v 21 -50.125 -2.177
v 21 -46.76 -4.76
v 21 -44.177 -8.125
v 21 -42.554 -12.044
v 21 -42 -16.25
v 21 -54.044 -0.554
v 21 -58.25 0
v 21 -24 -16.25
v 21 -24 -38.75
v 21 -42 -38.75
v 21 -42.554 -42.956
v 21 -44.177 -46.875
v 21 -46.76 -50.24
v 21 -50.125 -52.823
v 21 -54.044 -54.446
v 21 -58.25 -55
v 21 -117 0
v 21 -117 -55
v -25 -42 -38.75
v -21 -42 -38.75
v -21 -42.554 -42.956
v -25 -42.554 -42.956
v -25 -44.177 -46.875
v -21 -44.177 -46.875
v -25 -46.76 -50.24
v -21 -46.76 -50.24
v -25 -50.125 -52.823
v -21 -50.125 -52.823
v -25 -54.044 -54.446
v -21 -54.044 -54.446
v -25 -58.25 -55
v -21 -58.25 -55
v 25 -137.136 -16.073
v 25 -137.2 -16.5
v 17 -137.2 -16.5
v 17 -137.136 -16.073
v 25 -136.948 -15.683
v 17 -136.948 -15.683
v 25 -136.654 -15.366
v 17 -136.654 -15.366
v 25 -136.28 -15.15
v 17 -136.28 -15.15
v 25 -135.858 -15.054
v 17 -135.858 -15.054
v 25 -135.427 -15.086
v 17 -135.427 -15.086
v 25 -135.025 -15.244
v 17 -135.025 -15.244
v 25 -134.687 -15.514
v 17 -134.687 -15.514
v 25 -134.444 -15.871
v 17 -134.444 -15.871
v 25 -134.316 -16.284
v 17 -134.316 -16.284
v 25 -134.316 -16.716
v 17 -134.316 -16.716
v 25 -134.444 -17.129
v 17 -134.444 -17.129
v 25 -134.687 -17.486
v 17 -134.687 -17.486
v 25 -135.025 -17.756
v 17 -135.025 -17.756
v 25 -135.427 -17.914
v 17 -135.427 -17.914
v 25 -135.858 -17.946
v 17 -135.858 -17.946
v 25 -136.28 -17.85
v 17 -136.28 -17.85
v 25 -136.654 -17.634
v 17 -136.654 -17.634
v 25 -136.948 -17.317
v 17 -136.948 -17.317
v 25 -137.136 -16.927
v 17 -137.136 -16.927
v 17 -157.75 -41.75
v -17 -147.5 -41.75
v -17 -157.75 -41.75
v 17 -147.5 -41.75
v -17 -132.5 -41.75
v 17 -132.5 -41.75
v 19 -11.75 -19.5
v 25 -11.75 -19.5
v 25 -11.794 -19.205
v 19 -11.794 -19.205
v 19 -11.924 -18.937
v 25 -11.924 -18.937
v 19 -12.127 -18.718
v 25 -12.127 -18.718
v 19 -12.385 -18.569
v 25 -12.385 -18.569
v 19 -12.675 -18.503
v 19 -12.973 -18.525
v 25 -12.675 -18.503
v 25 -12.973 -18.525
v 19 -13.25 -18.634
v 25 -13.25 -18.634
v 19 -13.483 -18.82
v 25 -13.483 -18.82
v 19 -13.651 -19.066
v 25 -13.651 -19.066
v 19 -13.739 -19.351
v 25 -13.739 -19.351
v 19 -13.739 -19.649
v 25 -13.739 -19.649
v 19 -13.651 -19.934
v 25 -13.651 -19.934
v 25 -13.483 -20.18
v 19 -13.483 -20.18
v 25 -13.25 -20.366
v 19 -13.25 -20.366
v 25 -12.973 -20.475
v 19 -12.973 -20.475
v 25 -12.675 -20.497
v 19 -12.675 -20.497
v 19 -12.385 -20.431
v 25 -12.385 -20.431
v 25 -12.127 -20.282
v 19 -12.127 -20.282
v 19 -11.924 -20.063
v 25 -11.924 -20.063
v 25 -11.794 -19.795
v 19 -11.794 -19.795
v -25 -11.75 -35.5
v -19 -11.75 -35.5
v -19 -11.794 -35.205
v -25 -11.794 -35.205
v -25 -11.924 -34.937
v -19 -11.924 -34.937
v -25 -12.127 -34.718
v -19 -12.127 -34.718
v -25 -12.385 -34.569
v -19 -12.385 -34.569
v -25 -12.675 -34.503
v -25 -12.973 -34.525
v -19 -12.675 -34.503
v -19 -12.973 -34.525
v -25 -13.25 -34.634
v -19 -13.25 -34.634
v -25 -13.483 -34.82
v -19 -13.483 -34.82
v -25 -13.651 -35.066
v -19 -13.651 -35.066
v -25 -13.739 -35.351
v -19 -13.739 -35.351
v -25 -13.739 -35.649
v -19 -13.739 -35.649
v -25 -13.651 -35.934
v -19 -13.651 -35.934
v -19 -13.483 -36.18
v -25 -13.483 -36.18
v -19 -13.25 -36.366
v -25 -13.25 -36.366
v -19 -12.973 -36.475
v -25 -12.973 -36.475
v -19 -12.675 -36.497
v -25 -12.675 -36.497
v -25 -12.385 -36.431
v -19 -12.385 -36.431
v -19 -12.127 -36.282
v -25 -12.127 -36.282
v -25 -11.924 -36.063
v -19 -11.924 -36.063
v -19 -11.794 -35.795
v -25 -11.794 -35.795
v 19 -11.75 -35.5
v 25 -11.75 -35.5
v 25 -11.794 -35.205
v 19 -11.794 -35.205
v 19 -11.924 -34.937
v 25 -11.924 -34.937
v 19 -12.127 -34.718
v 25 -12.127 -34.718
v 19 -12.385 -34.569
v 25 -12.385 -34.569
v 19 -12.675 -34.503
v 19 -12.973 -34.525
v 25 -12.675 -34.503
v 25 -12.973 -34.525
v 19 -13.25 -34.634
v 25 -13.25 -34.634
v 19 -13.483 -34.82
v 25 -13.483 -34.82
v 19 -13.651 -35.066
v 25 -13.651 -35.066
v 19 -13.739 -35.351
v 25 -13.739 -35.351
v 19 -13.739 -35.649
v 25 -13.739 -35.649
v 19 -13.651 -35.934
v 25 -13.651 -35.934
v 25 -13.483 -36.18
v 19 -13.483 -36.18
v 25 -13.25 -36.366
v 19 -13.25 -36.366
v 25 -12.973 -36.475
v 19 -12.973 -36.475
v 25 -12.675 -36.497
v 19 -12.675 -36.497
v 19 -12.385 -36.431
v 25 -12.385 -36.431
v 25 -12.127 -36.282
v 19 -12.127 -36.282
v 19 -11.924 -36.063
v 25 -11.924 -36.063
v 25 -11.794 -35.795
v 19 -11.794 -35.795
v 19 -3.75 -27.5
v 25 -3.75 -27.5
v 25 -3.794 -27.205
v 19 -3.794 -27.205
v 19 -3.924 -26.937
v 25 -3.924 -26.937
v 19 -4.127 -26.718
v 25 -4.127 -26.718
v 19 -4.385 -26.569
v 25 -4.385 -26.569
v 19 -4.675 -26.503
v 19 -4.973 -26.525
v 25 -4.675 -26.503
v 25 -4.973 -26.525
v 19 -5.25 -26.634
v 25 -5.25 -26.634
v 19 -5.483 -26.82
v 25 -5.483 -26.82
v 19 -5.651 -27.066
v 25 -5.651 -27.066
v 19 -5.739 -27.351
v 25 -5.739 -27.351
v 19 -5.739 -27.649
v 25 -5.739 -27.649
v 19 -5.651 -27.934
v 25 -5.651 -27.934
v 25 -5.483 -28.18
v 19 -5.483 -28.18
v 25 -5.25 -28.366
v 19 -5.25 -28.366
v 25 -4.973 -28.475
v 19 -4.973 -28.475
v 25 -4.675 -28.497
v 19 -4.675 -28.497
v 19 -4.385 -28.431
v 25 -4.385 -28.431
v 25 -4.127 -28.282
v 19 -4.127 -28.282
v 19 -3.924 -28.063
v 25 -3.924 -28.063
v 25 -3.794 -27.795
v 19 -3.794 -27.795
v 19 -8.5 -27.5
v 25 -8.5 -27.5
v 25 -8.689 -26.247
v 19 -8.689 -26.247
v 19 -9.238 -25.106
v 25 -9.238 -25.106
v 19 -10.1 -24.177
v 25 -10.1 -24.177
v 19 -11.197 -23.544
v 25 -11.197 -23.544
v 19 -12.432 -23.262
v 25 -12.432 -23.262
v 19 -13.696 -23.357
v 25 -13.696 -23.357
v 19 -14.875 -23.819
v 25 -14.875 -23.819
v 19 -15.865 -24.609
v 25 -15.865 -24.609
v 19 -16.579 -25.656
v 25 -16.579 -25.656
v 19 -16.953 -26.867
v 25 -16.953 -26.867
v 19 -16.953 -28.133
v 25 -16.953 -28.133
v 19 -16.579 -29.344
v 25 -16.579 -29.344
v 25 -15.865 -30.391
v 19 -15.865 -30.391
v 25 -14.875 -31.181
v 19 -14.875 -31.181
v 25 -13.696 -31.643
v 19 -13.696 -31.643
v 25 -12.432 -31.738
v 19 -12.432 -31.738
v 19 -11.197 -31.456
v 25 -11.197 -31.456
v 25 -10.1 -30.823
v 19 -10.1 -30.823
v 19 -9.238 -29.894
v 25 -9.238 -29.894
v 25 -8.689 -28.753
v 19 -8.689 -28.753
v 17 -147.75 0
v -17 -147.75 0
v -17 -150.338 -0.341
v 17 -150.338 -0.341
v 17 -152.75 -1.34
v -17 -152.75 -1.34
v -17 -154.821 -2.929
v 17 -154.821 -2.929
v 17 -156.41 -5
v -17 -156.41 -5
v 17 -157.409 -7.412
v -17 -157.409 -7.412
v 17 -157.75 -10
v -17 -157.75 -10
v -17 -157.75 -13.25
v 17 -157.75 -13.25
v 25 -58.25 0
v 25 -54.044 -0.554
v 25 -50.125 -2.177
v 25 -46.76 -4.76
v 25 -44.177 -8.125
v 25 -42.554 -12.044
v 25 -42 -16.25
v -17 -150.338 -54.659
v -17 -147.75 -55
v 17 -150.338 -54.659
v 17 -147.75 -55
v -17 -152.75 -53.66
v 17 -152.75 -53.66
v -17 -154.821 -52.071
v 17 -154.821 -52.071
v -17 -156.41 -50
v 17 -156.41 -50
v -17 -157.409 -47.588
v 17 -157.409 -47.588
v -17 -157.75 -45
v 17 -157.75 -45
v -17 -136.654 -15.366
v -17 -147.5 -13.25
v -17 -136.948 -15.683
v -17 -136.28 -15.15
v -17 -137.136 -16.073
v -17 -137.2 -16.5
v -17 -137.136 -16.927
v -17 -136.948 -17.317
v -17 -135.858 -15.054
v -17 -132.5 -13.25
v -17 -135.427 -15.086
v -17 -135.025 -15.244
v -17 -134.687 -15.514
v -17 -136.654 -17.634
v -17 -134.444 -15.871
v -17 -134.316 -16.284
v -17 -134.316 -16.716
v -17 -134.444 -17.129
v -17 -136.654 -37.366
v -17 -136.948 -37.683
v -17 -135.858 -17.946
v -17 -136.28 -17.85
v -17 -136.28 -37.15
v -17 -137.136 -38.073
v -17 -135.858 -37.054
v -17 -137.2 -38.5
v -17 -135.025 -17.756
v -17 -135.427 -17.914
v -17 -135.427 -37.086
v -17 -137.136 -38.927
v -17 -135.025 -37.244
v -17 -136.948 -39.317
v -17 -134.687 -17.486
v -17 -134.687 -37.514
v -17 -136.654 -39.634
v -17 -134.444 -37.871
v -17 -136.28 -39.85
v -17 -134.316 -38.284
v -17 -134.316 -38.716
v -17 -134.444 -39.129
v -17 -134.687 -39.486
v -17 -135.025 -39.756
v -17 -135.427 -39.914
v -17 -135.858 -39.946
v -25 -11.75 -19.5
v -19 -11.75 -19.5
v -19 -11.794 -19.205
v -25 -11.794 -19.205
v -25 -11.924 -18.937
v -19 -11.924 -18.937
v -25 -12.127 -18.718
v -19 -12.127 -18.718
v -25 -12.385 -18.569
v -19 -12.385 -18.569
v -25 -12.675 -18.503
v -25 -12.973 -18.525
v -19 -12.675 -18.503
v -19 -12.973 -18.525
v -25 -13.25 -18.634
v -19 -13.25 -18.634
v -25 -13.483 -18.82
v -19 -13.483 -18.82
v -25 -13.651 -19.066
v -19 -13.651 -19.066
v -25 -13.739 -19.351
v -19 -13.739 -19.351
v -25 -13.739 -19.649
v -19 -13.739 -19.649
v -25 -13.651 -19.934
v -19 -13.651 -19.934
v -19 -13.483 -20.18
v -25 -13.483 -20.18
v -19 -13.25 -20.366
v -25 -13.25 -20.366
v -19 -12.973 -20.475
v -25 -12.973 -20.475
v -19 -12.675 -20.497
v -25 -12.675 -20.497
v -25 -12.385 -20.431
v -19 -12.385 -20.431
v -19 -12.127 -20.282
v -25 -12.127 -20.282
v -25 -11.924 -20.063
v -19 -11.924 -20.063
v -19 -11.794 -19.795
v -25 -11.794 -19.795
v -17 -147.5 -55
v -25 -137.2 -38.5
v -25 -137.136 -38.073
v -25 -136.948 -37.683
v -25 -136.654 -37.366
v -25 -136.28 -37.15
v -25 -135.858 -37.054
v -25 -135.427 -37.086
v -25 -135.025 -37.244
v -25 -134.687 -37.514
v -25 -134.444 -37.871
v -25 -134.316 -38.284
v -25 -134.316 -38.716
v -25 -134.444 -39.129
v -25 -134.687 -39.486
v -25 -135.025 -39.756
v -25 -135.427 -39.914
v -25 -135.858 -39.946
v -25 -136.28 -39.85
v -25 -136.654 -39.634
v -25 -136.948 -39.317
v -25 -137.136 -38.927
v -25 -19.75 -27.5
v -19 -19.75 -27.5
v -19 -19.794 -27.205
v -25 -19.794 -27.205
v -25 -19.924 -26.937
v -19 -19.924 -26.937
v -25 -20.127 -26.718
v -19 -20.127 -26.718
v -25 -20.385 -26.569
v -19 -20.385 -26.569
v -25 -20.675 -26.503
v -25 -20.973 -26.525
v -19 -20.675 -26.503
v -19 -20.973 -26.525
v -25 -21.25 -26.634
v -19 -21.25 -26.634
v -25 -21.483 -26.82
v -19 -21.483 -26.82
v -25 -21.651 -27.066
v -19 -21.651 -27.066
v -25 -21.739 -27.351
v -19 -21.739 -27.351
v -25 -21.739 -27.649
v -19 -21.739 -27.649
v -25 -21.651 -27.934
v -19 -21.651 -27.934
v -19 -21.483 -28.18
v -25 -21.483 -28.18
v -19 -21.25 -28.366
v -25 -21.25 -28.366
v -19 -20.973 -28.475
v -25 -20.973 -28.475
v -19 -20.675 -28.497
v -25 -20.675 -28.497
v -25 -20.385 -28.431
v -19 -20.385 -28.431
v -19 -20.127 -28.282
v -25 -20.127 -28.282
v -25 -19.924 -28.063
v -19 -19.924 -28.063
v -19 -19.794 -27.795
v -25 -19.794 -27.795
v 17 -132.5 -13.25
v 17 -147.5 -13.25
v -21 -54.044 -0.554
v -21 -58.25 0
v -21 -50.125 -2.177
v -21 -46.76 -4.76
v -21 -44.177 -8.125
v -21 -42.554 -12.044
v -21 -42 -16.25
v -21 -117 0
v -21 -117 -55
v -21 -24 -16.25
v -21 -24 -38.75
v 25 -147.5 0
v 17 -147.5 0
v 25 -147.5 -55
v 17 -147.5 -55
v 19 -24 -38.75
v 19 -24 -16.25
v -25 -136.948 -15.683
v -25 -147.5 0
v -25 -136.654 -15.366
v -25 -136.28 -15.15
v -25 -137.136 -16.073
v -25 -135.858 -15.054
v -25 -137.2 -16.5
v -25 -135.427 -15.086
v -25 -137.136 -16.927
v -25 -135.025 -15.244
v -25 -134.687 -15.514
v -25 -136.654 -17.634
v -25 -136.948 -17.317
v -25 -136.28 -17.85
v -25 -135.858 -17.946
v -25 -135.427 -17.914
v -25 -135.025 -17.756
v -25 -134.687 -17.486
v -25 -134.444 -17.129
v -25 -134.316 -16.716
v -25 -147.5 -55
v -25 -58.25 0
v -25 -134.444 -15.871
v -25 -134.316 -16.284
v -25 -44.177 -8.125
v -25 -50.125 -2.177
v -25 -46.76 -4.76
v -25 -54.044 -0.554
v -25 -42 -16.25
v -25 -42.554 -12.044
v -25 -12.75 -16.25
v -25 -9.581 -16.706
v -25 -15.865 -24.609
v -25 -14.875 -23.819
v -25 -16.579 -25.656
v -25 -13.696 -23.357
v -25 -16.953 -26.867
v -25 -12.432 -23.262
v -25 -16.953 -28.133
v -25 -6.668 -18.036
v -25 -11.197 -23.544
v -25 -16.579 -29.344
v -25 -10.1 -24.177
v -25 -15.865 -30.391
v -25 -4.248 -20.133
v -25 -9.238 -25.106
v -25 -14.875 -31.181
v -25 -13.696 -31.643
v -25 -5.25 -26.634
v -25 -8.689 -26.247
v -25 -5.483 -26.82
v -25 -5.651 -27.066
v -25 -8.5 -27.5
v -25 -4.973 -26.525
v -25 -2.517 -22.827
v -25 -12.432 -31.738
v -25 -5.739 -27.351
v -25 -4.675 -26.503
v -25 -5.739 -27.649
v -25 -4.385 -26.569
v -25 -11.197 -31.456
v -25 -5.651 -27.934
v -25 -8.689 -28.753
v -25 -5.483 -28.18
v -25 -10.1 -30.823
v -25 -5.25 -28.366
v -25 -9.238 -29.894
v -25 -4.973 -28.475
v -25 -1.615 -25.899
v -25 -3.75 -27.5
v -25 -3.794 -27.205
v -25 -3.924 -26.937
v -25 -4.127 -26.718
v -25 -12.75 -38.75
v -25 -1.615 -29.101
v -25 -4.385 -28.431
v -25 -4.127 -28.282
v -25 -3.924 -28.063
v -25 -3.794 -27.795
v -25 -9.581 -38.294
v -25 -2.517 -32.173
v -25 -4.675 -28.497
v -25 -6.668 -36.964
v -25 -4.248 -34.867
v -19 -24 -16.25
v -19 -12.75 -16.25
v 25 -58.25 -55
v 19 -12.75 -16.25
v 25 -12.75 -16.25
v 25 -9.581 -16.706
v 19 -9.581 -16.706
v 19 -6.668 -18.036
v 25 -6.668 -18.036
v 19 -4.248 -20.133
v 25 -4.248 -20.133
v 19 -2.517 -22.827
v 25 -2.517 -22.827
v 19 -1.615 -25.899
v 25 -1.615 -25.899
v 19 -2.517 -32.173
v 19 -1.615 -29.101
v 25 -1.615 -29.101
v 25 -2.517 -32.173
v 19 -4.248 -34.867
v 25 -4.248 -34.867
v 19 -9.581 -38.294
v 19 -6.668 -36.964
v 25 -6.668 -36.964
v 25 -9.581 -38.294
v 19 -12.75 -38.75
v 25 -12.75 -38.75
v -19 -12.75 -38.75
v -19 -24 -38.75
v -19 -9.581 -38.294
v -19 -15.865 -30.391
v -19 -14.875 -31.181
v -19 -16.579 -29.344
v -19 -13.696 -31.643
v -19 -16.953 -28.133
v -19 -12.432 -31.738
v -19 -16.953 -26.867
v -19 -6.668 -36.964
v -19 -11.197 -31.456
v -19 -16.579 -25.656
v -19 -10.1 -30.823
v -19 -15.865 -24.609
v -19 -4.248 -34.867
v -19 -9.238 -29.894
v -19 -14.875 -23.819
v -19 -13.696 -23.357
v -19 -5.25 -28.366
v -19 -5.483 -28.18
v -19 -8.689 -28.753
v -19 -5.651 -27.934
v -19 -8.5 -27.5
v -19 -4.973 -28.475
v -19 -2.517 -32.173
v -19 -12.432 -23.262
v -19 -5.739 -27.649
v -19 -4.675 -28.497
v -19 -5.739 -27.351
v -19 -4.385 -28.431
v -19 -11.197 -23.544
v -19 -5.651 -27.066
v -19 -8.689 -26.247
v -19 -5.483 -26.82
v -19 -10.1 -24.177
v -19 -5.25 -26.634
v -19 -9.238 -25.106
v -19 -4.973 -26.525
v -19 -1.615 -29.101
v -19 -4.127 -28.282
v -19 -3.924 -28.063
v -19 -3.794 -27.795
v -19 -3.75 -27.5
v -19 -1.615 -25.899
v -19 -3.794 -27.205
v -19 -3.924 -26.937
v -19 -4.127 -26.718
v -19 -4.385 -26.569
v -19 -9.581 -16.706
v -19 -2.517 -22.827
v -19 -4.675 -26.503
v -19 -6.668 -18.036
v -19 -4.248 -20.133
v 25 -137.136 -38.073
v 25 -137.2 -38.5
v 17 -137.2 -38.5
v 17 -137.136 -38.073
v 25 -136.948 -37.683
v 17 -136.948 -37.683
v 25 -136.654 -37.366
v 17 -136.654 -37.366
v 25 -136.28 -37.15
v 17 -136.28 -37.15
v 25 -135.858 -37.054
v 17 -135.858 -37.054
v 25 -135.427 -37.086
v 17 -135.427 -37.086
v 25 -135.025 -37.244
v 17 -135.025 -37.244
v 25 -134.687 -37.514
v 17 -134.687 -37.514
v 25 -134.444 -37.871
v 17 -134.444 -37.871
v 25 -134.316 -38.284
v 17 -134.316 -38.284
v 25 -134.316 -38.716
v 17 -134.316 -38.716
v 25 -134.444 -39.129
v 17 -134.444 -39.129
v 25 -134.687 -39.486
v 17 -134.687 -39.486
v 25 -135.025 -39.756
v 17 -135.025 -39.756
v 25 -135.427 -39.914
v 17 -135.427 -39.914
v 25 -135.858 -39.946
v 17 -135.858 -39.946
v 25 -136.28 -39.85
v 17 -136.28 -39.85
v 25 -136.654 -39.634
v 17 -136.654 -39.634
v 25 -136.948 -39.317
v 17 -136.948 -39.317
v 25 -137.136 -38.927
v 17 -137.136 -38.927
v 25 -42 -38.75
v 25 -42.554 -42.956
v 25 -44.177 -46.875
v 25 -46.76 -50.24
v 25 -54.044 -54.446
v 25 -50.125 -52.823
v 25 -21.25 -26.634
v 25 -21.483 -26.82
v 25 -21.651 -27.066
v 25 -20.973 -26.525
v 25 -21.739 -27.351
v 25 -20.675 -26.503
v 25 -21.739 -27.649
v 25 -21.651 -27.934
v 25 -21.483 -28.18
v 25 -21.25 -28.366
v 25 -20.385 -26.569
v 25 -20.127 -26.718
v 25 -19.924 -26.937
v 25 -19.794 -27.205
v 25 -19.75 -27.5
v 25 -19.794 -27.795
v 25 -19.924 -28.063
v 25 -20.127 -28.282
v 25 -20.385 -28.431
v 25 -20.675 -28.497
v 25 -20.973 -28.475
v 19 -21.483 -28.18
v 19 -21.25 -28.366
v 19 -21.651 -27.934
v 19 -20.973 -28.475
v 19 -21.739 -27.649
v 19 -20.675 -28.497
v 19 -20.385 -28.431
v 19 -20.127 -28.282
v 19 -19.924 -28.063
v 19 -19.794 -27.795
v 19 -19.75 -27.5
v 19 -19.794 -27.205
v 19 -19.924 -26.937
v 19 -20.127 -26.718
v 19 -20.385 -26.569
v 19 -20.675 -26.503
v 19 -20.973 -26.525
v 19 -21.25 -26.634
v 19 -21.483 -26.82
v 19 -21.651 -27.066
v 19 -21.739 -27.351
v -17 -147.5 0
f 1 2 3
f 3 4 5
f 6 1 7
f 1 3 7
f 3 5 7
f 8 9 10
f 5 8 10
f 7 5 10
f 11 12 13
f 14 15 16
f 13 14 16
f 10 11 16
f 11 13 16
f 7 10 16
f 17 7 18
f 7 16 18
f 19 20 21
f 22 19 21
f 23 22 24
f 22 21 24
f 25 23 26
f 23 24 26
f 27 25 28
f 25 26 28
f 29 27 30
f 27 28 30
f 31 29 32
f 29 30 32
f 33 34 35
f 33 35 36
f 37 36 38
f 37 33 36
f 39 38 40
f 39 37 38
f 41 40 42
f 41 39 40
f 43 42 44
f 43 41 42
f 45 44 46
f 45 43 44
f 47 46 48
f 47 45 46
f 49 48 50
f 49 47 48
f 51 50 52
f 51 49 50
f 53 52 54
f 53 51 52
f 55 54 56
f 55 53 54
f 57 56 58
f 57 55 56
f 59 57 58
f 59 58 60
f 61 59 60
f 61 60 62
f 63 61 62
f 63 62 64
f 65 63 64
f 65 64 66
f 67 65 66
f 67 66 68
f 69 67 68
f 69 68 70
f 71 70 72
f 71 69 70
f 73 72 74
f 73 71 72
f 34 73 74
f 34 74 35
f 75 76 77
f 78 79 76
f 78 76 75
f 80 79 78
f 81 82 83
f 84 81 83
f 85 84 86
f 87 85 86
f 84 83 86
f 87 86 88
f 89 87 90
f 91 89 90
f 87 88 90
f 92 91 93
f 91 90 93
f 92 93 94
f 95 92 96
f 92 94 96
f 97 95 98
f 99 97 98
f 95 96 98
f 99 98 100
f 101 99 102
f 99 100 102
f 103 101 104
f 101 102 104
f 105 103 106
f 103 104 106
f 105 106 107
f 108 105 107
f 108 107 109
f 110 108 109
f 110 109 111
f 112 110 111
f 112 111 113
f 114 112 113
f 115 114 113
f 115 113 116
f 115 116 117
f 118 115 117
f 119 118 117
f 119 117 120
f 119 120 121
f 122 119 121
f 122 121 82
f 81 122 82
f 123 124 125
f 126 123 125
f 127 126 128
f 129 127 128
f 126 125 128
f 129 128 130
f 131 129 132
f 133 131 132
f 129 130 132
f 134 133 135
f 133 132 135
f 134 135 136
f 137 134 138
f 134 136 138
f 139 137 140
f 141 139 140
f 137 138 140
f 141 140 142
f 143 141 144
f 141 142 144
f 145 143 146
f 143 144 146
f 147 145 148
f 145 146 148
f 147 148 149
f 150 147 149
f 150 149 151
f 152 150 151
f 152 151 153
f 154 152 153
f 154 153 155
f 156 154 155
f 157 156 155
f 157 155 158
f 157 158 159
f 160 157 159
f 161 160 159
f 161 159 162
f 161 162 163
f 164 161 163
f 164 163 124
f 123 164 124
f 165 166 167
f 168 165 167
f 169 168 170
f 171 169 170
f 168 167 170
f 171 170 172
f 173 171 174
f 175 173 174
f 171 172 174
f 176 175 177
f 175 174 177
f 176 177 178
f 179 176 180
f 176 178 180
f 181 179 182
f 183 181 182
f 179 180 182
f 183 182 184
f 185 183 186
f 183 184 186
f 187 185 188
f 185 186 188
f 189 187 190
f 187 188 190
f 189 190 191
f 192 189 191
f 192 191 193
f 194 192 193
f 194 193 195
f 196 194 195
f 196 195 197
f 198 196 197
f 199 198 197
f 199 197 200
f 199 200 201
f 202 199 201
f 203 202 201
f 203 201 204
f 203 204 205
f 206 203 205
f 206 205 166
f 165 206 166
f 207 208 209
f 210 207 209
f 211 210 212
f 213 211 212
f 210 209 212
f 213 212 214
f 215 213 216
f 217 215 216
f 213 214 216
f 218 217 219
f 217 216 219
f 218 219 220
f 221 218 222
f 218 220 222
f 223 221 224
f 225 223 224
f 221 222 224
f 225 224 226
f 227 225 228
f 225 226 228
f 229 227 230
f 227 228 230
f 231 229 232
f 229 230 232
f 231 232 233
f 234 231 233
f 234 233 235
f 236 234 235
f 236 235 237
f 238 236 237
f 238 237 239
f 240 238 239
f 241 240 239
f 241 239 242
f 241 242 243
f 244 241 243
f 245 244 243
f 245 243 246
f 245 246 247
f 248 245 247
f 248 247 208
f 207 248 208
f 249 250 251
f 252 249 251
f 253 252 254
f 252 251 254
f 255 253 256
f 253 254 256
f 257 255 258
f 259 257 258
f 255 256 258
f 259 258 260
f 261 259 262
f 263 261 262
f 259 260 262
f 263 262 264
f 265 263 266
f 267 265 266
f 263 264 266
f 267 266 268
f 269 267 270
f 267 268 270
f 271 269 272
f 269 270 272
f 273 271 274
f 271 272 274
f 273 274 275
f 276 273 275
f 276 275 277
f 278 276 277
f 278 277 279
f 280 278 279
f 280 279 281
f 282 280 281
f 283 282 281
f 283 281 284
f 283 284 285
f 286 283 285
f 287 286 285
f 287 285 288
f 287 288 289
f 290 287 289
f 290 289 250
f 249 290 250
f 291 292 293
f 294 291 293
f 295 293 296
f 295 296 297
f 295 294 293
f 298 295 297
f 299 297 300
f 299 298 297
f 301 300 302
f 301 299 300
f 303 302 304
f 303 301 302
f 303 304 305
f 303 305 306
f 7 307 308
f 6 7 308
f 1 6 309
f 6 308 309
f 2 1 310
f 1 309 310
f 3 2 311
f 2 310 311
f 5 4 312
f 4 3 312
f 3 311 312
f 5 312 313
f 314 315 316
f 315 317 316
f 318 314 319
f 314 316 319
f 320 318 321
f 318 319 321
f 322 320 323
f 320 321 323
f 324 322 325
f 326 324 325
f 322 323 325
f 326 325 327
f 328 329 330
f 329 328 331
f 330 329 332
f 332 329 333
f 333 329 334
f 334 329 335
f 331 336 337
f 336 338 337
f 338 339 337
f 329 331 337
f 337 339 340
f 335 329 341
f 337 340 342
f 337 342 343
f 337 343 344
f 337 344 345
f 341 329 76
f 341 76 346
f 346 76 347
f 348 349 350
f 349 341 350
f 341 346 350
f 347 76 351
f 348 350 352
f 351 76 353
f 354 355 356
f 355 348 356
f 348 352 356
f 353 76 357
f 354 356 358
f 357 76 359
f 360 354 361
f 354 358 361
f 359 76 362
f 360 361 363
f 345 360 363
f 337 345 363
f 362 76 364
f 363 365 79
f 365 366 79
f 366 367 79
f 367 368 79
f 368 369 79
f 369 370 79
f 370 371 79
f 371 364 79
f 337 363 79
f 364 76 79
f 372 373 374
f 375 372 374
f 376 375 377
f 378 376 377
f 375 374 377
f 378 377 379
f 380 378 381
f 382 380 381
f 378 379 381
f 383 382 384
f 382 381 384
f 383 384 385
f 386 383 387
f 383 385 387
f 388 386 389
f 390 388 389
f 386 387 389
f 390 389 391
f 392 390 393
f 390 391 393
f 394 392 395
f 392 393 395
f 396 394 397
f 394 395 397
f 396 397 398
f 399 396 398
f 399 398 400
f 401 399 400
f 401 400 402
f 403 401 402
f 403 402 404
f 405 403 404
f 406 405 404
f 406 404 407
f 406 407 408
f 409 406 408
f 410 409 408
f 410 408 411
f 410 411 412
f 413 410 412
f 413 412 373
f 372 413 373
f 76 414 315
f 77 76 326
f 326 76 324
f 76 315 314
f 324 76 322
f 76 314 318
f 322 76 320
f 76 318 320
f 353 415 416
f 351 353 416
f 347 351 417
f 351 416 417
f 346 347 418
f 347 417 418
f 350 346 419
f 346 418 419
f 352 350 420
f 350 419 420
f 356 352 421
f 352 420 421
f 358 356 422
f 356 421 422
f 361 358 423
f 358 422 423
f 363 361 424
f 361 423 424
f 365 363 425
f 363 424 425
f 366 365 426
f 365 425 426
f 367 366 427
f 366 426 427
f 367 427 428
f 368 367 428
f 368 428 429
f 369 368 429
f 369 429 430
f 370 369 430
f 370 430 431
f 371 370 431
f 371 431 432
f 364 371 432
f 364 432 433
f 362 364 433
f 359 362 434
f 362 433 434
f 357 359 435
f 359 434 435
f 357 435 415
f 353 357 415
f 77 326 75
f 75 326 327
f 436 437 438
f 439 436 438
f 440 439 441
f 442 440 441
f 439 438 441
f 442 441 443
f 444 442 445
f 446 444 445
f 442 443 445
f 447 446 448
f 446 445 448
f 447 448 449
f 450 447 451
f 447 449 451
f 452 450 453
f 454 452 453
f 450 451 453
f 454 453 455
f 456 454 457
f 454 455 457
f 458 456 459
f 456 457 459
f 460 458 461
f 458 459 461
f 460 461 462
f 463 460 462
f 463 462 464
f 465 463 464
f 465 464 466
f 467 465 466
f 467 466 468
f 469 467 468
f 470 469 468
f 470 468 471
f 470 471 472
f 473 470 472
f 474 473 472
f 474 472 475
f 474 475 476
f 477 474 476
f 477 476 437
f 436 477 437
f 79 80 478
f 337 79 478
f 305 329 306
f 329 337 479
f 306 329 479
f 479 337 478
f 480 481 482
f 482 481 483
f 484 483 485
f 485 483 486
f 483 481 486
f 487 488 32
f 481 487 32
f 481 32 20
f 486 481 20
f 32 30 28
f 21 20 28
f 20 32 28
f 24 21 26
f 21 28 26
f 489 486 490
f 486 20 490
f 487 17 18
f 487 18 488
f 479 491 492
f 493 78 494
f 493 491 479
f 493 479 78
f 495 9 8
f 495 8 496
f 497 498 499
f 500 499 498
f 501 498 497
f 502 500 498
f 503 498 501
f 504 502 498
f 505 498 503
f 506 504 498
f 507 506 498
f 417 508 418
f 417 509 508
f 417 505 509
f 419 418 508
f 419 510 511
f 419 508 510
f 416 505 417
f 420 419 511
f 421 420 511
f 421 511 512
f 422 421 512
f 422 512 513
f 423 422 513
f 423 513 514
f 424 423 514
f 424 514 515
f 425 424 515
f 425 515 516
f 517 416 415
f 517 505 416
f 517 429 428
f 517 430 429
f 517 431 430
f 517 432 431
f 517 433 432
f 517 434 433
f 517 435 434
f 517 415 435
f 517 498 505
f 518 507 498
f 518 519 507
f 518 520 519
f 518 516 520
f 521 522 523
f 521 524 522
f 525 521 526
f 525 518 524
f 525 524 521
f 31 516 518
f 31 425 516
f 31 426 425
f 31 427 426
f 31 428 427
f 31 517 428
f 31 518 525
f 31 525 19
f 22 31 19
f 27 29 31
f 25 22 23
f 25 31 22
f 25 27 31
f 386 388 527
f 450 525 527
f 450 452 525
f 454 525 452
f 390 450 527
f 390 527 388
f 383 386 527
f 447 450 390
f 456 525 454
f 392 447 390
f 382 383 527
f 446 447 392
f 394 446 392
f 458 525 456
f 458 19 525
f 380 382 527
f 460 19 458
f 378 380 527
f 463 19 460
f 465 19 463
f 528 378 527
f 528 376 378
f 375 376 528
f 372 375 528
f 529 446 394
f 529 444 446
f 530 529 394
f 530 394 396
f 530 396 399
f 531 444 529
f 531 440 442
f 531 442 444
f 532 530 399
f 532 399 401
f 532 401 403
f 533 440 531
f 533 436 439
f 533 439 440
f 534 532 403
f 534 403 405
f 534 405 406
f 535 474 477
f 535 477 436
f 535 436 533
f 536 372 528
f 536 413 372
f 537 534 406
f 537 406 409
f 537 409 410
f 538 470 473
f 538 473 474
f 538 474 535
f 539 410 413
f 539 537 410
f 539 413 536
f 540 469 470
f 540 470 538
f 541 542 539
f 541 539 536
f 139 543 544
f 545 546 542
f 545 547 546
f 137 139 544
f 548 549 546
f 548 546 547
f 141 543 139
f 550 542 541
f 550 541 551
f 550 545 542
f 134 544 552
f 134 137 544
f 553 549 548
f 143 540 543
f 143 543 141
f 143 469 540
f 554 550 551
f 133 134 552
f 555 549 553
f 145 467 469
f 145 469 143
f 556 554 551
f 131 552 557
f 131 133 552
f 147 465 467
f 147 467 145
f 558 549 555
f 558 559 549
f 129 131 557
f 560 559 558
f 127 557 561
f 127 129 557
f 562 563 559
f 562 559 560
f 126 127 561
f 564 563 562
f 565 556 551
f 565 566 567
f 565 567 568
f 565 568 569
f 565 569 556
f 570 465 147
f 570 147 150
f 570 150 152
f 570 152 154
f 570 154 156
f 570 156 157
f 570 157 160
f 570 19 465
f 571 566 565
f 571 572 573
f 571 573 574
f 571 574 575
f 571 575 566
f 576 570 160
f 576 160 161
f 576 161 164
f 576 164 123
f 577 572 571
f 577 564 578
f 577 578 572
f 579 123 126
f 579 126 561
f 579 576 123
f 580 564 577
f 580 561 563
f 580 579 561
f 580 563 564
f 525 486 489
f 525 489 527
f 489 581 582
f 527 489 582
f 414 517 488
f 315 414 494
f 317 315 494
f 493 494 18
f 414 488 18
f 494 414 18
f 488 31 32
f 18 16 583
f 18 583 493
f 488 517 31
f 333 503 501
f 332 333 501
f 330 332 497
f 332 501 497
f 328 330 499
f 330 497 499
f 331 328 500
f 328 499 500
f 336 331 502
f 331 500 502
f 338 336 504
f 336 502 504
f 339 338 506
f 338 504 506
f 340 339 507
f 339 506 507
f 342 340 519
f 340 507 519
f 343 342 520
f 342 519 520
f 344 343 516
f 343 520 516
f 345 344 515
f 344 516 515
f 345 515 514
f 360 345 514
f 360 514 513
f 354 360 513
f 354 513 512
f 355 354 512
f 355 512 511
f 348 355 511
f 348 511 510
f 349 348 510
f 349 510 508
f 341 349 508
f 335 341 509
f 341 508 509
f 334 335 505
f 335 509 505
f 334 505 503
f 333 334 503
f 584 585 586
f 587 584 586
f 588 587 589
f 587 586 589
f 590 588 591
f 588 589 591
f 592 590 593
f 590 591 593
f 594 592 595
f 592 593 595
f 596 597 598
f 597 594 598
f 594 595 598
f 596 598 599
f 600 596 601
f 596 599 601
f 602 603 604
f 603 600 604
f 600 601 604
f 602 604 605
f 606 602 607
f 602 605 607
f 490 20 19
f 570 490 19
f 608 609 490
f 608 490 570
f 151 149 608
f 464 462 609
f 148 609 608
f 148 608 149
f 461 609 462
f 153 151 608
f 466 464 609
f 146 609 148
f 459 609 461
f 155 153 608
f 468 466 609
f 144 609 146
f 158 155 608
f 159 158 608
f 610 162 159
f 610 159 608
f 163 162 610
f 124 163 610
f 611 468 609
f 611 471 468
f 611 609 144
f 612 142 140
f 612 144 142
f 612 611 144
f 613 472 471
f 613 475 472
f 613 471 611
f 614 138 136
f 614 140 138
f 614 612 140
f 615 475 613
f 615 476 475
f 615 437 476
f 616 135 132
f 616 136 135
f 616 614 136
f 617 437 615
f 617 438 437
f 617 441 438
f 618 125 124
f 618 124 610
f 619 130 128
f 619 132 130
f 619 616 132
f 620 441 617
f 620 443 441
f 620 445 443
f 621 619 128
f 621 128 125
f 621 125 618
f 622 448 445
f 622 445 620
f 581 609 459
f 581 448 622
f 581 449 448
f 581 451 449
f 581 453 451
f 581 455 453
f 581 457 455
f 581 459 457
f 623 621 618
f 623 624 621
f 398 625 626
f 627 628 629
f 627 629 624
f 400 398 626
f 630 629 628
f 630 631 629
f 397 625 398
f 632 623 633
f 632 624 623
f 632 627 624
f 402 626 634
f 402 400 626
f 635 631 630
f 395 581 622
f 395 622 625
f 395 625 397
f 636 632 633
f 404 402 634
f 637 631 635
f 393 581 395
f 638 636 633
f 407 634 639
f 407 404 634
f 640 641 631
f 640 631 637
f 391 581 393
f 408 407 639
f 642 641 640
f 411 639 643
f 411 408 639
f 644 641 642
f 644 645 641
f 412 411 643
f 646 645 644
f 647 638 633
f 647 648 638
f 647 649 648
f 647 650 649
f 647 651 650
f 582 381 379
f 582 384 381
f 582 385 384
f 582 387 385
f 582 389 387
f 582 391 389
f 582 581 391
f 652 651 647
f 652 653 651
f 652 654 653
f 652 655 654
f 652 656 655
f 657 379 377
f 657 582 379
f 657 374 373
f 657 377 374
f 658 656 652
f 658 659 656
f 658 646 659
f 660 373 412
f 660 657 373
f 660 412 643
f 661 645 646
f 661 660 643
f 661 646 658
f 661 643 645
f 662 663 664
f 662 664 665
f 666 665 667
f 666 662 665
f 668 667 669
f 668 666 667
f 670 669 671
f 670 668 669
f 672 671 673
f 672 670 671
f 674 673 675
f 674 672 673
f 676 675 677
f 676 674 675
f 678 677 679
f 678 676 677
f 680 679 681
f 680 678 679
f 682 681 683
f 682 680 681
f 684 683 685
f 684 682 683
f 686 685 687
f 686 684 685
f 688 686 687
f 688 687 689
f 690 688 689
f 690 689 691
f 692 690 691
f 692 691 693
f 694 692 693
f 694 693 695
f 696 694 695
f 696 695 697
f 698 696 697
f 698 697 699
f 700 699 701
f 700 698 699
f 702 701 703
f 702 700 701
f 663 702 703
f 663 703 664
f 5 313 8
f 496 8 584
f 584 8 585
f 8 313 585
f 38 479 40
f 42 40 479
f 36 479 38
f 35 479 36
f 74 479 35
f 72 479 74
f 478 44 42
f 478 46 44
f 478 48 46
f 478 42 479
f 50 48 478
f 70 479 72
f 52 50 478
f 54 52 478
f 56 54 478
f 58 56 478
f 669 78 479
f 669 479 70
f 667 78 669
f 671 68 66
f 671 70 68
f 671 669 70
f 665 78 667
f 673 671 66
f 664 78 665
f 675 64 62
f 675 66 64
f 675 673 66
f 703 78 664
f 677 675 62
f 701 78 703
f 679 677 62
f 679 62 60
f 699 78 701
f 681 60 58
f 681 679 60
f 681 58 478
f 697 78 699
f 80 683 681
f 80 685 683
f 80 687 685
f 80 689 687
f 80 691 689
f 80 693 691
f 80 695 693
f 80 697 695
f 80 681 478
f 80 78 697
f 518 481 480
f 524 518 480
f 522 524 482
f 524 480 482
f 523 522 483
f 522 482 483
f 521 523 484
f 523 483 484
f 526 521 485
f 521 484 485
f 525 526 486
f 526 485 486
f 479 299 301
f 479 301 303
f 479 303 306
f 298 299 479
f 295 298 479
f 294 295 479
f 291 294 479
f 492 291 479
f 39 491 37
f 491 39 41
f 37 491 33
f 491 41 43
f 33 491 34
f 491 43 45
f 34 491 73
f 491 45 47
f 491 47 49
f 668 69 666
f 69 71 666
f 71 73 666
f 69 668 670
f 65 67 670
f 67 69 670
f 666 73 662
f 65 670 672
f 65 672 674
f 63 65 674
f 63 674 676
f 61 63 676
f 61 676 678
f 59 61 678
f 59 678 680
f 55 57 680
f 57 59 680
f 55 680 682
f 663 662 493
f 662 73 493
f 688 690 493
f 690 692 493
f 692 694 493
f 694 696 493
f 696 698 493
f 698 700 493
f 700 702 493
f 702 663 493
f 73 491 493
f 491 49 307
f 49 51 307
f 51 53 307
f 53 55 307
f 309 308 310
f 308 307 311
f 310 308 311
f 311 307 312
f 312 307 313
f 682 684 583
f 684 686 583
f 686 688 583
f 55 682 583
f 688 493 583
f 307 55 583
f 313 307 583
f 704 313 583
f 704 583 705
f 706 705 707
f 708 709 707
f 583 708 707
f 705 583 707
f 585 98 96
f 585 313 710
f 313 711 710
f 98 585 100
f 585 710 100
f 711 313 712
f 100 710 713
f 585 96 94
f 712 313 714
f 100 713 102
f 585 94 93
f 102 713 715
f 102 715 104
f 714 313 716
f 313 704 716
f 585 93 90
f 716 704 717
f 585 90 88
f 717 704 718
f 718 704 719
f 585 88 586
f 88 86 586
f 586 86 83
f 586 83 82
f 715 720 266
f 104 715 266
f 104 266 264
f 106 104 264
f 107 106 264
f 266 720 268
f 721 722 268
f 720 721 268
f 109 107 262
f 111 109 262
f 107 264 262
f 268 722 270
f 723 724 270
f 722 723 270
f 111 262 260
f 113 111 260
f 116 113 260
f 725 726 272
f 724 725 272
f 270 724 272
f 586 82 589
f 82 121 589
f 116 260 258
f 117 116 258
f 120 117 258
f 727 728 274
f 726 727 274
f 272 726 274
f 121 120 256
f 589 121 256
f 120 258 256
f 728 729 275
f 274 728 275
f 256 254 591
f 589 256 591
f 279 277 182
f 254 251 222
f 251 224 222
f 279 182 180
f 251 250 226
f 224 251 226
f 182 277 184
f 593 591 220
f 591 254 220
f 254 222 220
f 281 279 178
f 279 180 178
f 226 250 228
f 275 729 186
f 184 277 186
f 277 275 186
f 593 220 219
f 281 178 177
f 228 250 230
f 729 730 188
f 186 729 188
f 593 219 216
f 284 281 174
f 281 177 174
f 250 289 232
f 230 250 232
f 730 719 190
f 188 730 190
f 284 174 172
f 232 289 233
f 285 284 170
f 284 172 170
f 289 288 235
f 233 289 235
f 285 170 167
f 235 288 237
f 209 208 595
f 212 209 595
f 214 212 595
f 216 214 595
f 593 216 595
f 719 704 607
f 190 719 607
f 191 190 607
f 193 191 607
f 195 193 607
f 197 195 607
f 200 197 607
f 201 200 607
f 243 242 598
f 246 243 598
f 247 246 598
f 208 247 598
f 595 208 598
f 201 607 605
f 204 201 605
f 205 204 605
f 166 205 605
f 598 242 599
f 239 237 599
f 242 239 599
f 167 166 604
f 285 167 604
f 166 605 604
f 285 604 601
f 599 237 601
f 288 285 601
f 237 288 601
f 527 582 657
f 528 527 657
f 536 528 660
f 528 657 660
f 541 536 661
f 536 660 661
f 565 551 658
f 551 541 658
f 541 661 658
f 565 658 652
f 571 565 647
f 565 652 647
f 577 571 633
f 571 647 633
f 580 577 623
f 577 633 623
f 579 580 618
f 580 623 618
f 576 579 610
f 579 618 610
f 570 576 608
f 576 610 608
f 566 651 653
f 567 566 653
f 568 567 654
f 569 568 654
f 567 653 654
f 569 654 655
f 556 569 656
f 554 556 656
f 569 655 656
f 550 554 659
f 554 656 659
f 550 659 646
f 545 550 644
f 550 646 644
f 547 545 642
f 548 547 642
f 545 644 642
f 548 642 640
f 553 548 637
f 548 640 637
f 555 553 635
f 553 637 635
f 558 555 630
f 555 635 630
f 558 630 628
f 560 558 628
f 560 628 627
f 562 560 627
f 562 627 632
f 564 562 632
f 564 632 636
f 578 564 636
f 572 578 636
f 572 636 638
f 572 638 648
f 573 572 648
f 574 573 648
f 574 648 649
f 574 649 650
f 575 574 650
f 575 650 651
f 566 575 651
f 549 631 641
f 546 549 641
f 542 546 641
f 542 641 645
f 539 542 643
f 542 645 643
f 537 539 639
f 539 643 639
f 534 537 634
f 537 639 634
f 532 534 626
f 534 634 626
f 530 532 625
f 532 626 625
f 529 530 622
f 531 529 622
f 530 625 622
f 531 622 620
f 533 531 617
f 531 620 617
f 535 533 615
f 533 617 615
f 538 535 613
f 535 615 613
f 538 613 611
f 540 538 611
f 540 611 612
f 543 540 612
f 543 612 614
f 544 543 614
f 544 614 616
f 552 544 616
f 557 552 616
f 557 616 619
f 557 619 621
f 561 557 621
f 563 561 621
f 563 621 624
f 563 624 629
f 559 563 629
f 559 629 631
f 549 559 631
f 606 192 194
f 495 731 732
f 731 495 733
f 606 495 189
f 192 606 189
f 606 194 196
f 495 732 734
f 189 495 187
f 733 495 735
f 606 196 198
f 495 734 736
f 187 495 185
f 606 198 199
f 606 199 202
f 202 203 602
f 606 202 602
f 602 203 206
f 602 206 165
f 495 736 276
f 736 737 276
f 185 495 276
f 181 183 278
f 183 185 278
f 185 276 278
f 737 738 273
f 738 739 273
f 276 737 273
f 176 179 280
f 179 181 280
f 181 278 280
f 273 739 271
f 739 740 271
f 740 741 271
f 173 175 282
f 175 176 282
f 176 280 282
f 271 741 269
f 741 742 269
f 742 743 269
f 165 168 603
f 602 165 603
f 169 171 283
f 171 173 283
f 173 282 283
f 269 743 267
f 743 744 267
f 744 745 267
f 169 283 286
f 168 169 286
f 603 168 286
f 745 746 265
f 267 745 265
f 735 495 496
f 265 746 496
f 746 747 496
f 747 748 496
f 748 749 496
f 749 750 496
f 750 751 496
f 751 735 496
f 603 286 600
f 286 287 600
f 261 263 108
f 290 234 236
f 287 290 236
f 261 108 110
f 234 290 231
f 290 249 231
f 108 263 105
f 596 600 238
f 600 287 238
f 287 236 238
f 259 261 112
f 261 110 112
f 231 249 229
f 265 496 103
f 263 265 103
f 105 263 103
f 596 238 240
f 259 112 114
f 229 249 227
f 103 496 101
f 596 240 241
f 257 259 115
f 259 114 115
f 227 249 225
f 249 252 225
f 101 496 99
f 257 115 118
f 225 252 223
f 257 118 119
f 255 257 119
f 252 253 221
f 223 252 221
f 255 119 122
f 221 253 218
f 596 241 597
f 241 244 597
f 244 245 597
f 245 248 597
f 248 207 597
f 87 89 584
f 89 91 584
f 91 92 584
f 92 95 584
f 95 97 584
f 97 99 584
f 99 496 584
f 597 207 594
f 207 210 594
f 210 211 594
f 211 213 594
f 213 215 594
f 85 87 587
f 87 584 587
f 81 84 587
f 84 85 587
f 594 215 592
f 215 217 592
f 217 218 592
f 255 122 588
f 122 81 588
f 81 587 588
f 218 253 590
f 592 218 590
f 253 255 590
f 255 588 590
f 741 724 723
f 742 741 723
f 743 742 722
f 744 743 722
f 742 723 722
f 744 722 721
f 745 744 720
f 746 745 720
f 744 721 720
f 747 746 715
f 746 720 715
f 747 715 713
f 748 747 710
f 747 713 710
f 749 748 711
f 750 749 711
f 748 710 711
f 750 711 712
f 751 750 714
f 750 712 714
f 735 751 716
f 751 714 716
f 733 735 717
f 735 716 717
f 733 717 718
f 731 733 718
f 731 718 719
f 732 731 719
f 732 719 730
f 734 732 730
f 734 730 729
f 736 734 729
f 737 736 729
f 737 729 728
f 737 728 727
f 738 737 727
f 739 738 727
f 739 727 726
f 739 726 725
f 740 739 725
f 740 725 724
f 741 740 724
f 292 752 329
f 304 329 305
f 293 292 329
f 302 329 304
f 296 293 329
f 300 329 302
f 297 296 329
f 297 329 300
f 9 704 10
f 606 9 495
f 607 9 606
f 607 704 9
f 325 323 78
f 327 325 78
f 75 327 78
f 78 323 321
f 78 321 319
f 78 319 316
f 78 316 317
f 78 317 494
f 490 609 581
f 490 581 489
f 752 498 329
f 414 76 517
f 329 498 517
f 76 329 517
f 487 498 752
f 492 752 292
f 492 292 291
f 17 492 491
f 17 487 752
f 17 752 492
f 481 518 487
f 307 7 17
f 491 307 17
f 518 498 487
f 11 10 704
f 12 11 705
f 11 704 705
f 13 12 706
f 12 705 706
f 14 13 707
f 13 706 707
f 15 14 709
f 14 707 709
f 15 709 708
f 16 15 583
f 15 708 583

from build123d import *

# Parameters (mm, degrees)
SKETCH1_W           = 50
SKETCH1_H           = 170
BOSS_EXTRUDE1_DEPTH = 55
SKETCH2_W           = 34
SKETCH2_H           = 27
CUT_EXTRUDE1_DEPTH  = 181.416185527
SKETCH3_W           = 10
SKETCH3_H           = 24
SKETCH3_R           = 4.25
SKETCH3_R_2         = 1
CUT_EXTRUDE2_DEPTH  = 186.539753153
SKETCH4_W           = 2
SKETCH4_H           = 24
CUT_EXTRUDE3_DEPTH  = 178.623196683
SKETCH5_W           = 6.25
SKETCH5_H           = 11.25
CUT_EXTRUDE4_DEPTH  = 186.539753153
SKETCH6_W           = 38
SKETCH6_H           = 10
CUT_EXTRUDE5_DEPTH  = 181.416185527
SKETCH8_W           = 13.25
SKETCH8_H           = 2.25
CUT_EXTRUDE7_DEPTH  = 186.539753153
SKETCH9_W           = 34
SKETCH9_H           = 35.25
CUT_EXTRUDE8_DEPTH  = 179.297679458
SKETCH11_W          = 13.25
SKETCH11_H          = 20.25
CUT_EXTRUDE9_DEPTH  = 184.480414486
SKETCH12_W          = 28.5
SKETCH12_H          = 15
BOSS_EXTRUDE2_DEPTH = 8
SKETCH14_W          = 34
SKETCH14_H          = 15
SKETCH14_H_2        = 10.25
BOSS_EXTRUDE3_DEPTH = 13.25
SKETCH16_R          = 4.5
SKETCH16_R_2        = 2.5
CUT_EXTRUDE13_DEPTH = 8
SKETCH17_W          = 16.25
SKETCH17_H          = 18
CUT_EXTRUDE14_DEPTH = 175.384811552
CUT_EXTRUDE15_DEPTH = 175.384811552
SKETCH20_W          = 42
SKETCH20_H          = 6.25
SKETCH20_H_2        = 18
SKETCH20_H_3        = 58.75
CUT_EXTRUDE18_DEPTH = 169.923244404
SKETCH22_R          = 4.5
SKETCH22_R_2        = 1.45
BOSS_EXTRUDE4_DEPTH = 8
SKETCH23_W          = 2
SKETCH23_H          = 10
CUT_EXTRUDE19_DEPTH = 165.352137193
FILLET1_R           = 10


with BuildPart() as part:
    # Sketch1 → Boss-Extrude1 (new body)
    with BuildSketch(Plane.XY):
        with Locations((0, -85)):
            Rectangle(SKETCH1_W, SKETCH1_H)
    extrude(amount=-BOSS_EXTRUDE1_DEPTH)

    # Sketch2 → Cut-Extrude1 (cut, through all)
    with BuildSketch(Plane.XY):
        with Locations((0, -13.5)):
            Rectangle(SKETCH2_W, SKETCH2_H)
    extrude(amount=-CUT_EXTRUDE1_DEPTH, mode=Mode.SUBTRACT)

    # Sketch3 → Cut-Extrude2 (cut, through all)
    with BuildSketch(Plane(origin=(25, 0, 0), x_dir=(0, 0, -1), z_dir=(1, 0, 0))):
        with Locations((50, -12)):
            Rectangle(SKETCH3_W, SKETCH3_H)
        with Locations((5, -12)):
            Rectangle(SKETCH3_W, SKETCH3_H)
        with Locations(Location((27.5, -12.75, 0), (0, 0, 90))):
            Circle(SKETCH3_R)
        with Locations(Location((35.5, -12.75, 0), (0, 0, 90))):
            Circle(SKETCH3_R_2)
        with Locations(Location((27.5, -4.75, 0), (0, 0, 90))):
            Circle(SKETCH3_R_2)
        with Locations(Location((27.5, -20.75, 0), (0, 0, 90))):
            Circle(SKETCH3_R_2)
        with Locations(Location((19.5, -12.75, 0), (0, 0, 90))):
            Circle(SKETCH3_R_2)
    extrude(amount=-CUT_EXTRUDE2_DEPTH, mode=Mode.SUBTRACT)

    # Sketch4 → Cut-Extrude3 (cut, through all)
    with BuildSketch(Plane.XY.offset(-10)):
        with Locations((-18, -12)):
            Rectangle(SKETCH4_W, SKETCH4_H)
        with Locations((18, -12)):
            Rectangle(SKETCH4_W, SKETCH4_H)
    extrude(amount=-CUT_EXTRUDE3_DEPTH, mode=Mode.SUBTRACT)

    # Sketch5 → Cut-Extrude4 (cut, through all)
    with BuildSketch(Plane(origin=(25, 0, 0), x_dir=(0, 0, -1), z_dir=(1, 0, 0))):
        with BuildLine():
            Line((45, 0), (10, 0))
            Line((10, 0), (10, -12.75))
            Line((10, -12.75), (16.25, -12.75))
            ThreePointArc((16.25, -12.75), (27.5, -1.5), (38.75, -12.75))
            Line((38.75, -12.75), (45, -12.75))
            Line((45, -12.75), (45, 0))
        make_face()
        with Locations((13.125, -18.375)):
            Rectangle(SKETCH5_W, SKETCH5_H)
        with Locations((41.875, -18.375)):
            Rectangle(SKETCH5_W, SKETCH5_H)
    extrude(amount=-CUT_EXTRUDE4_DEPTH, mode=Mode.SUBTRACT)

    # Sketch6 → Cut-Extrude5 (cut, through all)
    with BuildSketch(Plane.XY):
        with Locations((0, -29)):
            Rectangle(SKETCH6_W, SKETCH6_H)
    extrude(amount=-CUT_EXTRUDE5_DEPTH, mode=Mode.SUBTRACT)

    # Sketch8 → Cut-Extrude7 (cut, through all)
    with BuildSketch(Plane(origin=(25, 0, 0), x_dir=(0, 0, -1), z_dir=(1, 0, 0))):
        with BuildLine():
            Line((27.5, -157.5), (27.5, -132.5))
            Line((27.5, -132.5), (13.25, -132.5))
            Line((13.25, -132.5), (13.25, -167.75))
            Line((13.25, -167.75), (17.25, -167.75))
            ThreePointArc((17.25, -167.75), (20.252155493, -160.502155493), (27.5, -157.5))
        make_face()
        with BuildLine():
            Line((41.75, -167.75), (41.75, -132.5))
            Line((41.75, -132.5), (27.5, -132.5))
            Line((27.5, -132.5), (27.5, -157.5))
            ThreePointArc((27.5, -157.5), (34.747844507, -160.502155493), (37.75, -167.75))
            Line((37.75, -167.75), (41.75, -167.75))
        make_face()
        with Locations((48.375, -168.875)):
            Rectangle(SKETCH8_W, SKETCH8_H)
        with Locations((6.625, -168.875)):
            Rectangle(SKETCH8_W, SKETCH8_H)
        with BuildLine():
            Line((17.25, -167.75), (13.25, -167.75))
            Line((13.25, -167.75), (13.25, -170))
            Line((13.25, -170), (17.5, -170))
            ThreePointArc((17.5, -170), (17.31269172, -168.881923142), (17.25, -167.75))
        make_face()
        with BuildLine():
            Line((41.75, -170), (41.75, -167.75))
            Line((41.75, -167.75), (37.75, -167.75))
            ThreePointArc((37.75, -167.75), (37.68730828, -168.881923142), (37.5, -170))
            Line((37.5, -170), (41.75, -170))
        make_face()
        with BuildLine():
            Line((27.5, -167.75), (27.5, -157.5))
            ThreePointArc((27.5, -157.5), (20.252155493, -160.502155493), (17.25, -167.75))
            Line((17.25, -167.75), (27.5, -167.75))
        make_face()
        with BuildLine():
            ThreePointArc((37.75, -167.75), (34.747844507, -160.502155493), (27.5, -157.5))
            Line((27.5, -157.5), (27.5, -167.75))
            Line((27.5, -167.75), (37.75, -167.75))
        make_face()
        with BuildLine():
            Line((27.5, -170), (27.5, -167.75))
            Line((27.5, -167.75), (17.25, -167.75))
            ThreePointArc((17.25, -167.75), (17.31269172, -168.881923142), (17.5, -170))
            Line((17.5, -170), (27.5, -170))
        make_face()
        with BuildLine():
            ThreePointArc((37.5, -170), (37.68730828, -168.881923142), (37.75, -167.75))
            Line((37.75, -167.75), (27.5, -167.75))
            Line((27.5, -167.75), (27.5, -170))
            Line((27.5, -170), (37.5, -170))
        make_face()
    extrude(amount=-CUT_EXTRUDE7_DEPTH, mode=Mode.SUBTRACT)

    # Sketch9 → Cut-Extrude8 (cut, through all)
    with BuildSketch(Plane.XY):
        with Locations((0, -150.125)):
            Rectangle(SKETCH9_W, SKETCH9_H)
    extrude(amount=-CUT_EXTRUDE8_DEPTH, mode=Mode.SUBTRACT)

    # Sketch11 → Cut-Extrude9 (cut, through all)
    with BuildSketch(Plane(origin=(25, 0, 0), x_dir=(0, 0, -1), z_dir=(1, 0, 0))):
        with BuildLine():
            ThreePointArc((17.25, -167.75), (20.252155493, -160.502155493), (27.5, -157.5))
            Line((27.5, -157.5), (27.5, -147.5))
            Line((27.5, -147.5), (13.25, -147.5))
            Line((13.25, -147.5), (13.25, -167.75))
            Line((13.25, -167.75), (17.25, -167.75))
        make_face()
        with BuildLine():
            Line((27.5, -147.5), (27.5, -157.5))
            ThreePointArc((27.5, -157.5), (34.747844507, -160.502155493), (37.75, -167.75))
            Line((37.75, -167.75), (41.75, -167.75))
            Line((41.75, -167.75), (41.75, -147.5))
            Line((41.75, -147.5), (27.5, -147.5))
        make_face()
        with Locations((48.375, -157.625)):
            Rectangle(SKETCH11_W, SKETCH11_H)
        with Locations((6.625, -157.625)):
            Rectangle(SKETCH11_W, SKETCH11_H)
    extrude(amount=-CUT_EXTRUDE9_DEPTH, mode=Mode.SUBTRACT)

    # Sketch12 → Boss-Extrude2 (add)
    with BuildSketch(Plane(origin=(25, 0, 0), x_dir=(0, 0, -1), z_dir=(1, 0, 0))):
        with Locations((27.5, -140)):
            Rectangle(SKETCH12_W, SKETCH12_H)
    boss_extrude2 = extrude(amount=-BOSS_EXTRUDE2_DEPTH)

    # Mirror1: Boss-Extrude2 across plane
    add(boss_extrude2.mirror(Plane(origin=(0, 0, 0), x_dir=(0, 0, 1), z_dir=(1, 0, 0))))

    # Sketch14 → Boss-Extrude3 (add)
    with BuildSketch(Plane.XY):
        with Locations((0, -140)):
            Rectangle(SKETCH14_W, SKETCH14_H)
        with Locations((0, -152.625)):
            Rectangle(SKETCH14_W, SKETCH14_H_2)
    boss_extrude3 = extrude(amount=-BOSS_EXTRUDE3_DEPTH)

    # Mirror2: Boss-Extrude3 across plane
    add(boss_extrude3.mirror(Plane.XY.offset(-27.5)))

    # Sketch16 → Cut-Extrude13 (cut)
    # profile 1 of 3: a face of its own
    with BuildSketch(Plane(origin=(25, 0, 0), x_dir=(0, 0, -1), z_dir=(1, 0, 0))):
        with Locations(Location((16.5, -135.75, 0), (0, 0, 90))):
            Circle(SKETCH16_R)
        with Locations((16.5, -135.75)):
            Circle(SKETCH16_R_2, mode=Mode.SUBTRACT)
    # profile 2 of 3: a face of its own
    with BuildSketch(Plane(origin=(25, 0, 0), x_dir=(0, 0, -1), z_dir=(1, 0, 0))):
        with Locations((16.5, -135.75)):
            Circle(SKETCH16_R_2)
    # profile 3 of 3: a face of its own
    with BuildSketch(Plane(origin=(25, 0, 0), x_dir=(0, 0, -1), z_dir=(1, 0, 0))):
        with Locations(Location((38.5, -135.75, 0), (0, 0, 90))):
            Circle(SKETCH16_R)
    cut_extrude13 = extrude(amount=-CUT_EXTRUDE13_DEPTH, mode=Mode.SUBTRACT)

    # Mirror3: Cut-Extrude13 across plane
    add(cut_extrude13.mirror(Plane(origin=(0, 0, 0), x_dir=(0, 0, 1), z_dir=(1, 0, 0))), mode=Mode.SUBTRACT)

    # Sketch17 → Cut-Extrude14 (cut, through all)
    with BuildSketch(Plane(origin=(25, 0, 0), x_dir=(0, 0, -1), z_dir=(1, 0, 0))):
        with Locations((46.875, -33)):
            Rectangle(SKETCH17_W, SKETCH17_H)
        with Locations((8.125, -33)):
            Rectangle(SKETCH17_W, SKETCH17_H)
    extrude(amount=-CUT_EXTRUDE14_DEPTH, mode=Mode.SUBTRACT)

    # Sketch18 → Cut-Extrude15 (cut, through all)
    with BuildSketch(Plane(origin=(25, 0, 0), x_dir=(0, 0, -1), z_dir=(1, 0, 0))):
        with BuildLine():
            ThreePointArc((0, -58.25), (4.759514806, -46.759514806), (16.25, -42))
            Line((16.25, -42), (0, -42))
            Line((0, -42), (0, -58.25))
        make_face()
        with BuildLine():
            Line((55, -42), (38.75, -42))
            ThreePointArc((38.75, -42), (50.240485194, -46.759514806), (55, -58.25))
            Line((55, -58.25), (55, -42))
        make_face()
    extrude(amount=-CUT_EXTRUDE15_DEPTH, mode=Mode.SUBTRACT)

    # Sketch20 → Cut-Extrude18 (cut, through all)
    with BuildSketch(Plane(origin=(0, 0, -55), x_dir=(-1, 0, 0), z_dir=(0, 0, -1))):
        with Locations((0, -55.125)):
            Rectangle(SKETCH20_W, SKETCH20_H)
        with Locations((0, -43)):
            Rectangle(SKETCH20_W, SKETCH20_H_2)
        with Locations((0, -87.625)):
            Rectangle(SKETCH20_W, SKETCH20_H_3)
    extrude(amount=-CUT_EXTRUDE18_DEPTH, mode=Mode.SUBTRACT)

    # Sketch22 → Boss-Extrude4 (add)
    # profile 1 of 2: a face of its own
    with BuildSketch(Plane.ZY.offset(25)):
        with Locations(Location((-38.5, -135.75, 0), (0, 0, 90))):
            Circle(SKETCH22_R)
        with Locations(Location((-38.5, -135.75, 0), (0, 0, 270))):
            Circle(SKETCH22_R_2, mode=Mode.SUBTRACT)
    # profile 2 of 2: a face of its own
    with BuildSketch(Plane.ZY.offset(25)):
        with Locations(Location((-16.5, -135.75, 0), (0, 0, 90))):
            Circle(SKETCH22_R)
        with Locations(Location((-16.5, -135.75, 0), (0, 0, 270))):
            Circle(SKETCH22_R_2, mode=Mode.SUBTRACT)
    boss_extrude4 = extrude(amount=-BOSS_EXTRUDE4_DEPTH)

    # Mirror4: Boss-Extrude4 across plane
    add(boss_extrude4.mirror(Plane(origin=(0, 0, 0), x_dir=(0, 0, 1), z_dir=(1, 0, 0))))

    # Sketch23 → Cut-Extrude19 (cut, through all)
    with BuildSketch(Plane(origin=(0, 0, -38.75), x_dir=(-1, 0, 0), z_dir=(0, 0, -1))):
        with Locations((-20, -29)):
            Rectangle(SKETCH23_W, SKETCH23_H)
        with Locations((20, -29)):
            Rectangle(SKETCH23_W, SKETCH23_H)
    extrude(amount=-CUT_EXTRUDE19_DEPTH, mode=Mode.SUBTRACT)

    # Fillet1
    fillet1_edges = [part.edges().sort_by_distance(p)[0] for p in [
        (0, -157.75, 0),
        (0, -157.75, -55),
    ]]
    fillet(fillet1_edges, radius=FILLET1_R)


solid = part.part
